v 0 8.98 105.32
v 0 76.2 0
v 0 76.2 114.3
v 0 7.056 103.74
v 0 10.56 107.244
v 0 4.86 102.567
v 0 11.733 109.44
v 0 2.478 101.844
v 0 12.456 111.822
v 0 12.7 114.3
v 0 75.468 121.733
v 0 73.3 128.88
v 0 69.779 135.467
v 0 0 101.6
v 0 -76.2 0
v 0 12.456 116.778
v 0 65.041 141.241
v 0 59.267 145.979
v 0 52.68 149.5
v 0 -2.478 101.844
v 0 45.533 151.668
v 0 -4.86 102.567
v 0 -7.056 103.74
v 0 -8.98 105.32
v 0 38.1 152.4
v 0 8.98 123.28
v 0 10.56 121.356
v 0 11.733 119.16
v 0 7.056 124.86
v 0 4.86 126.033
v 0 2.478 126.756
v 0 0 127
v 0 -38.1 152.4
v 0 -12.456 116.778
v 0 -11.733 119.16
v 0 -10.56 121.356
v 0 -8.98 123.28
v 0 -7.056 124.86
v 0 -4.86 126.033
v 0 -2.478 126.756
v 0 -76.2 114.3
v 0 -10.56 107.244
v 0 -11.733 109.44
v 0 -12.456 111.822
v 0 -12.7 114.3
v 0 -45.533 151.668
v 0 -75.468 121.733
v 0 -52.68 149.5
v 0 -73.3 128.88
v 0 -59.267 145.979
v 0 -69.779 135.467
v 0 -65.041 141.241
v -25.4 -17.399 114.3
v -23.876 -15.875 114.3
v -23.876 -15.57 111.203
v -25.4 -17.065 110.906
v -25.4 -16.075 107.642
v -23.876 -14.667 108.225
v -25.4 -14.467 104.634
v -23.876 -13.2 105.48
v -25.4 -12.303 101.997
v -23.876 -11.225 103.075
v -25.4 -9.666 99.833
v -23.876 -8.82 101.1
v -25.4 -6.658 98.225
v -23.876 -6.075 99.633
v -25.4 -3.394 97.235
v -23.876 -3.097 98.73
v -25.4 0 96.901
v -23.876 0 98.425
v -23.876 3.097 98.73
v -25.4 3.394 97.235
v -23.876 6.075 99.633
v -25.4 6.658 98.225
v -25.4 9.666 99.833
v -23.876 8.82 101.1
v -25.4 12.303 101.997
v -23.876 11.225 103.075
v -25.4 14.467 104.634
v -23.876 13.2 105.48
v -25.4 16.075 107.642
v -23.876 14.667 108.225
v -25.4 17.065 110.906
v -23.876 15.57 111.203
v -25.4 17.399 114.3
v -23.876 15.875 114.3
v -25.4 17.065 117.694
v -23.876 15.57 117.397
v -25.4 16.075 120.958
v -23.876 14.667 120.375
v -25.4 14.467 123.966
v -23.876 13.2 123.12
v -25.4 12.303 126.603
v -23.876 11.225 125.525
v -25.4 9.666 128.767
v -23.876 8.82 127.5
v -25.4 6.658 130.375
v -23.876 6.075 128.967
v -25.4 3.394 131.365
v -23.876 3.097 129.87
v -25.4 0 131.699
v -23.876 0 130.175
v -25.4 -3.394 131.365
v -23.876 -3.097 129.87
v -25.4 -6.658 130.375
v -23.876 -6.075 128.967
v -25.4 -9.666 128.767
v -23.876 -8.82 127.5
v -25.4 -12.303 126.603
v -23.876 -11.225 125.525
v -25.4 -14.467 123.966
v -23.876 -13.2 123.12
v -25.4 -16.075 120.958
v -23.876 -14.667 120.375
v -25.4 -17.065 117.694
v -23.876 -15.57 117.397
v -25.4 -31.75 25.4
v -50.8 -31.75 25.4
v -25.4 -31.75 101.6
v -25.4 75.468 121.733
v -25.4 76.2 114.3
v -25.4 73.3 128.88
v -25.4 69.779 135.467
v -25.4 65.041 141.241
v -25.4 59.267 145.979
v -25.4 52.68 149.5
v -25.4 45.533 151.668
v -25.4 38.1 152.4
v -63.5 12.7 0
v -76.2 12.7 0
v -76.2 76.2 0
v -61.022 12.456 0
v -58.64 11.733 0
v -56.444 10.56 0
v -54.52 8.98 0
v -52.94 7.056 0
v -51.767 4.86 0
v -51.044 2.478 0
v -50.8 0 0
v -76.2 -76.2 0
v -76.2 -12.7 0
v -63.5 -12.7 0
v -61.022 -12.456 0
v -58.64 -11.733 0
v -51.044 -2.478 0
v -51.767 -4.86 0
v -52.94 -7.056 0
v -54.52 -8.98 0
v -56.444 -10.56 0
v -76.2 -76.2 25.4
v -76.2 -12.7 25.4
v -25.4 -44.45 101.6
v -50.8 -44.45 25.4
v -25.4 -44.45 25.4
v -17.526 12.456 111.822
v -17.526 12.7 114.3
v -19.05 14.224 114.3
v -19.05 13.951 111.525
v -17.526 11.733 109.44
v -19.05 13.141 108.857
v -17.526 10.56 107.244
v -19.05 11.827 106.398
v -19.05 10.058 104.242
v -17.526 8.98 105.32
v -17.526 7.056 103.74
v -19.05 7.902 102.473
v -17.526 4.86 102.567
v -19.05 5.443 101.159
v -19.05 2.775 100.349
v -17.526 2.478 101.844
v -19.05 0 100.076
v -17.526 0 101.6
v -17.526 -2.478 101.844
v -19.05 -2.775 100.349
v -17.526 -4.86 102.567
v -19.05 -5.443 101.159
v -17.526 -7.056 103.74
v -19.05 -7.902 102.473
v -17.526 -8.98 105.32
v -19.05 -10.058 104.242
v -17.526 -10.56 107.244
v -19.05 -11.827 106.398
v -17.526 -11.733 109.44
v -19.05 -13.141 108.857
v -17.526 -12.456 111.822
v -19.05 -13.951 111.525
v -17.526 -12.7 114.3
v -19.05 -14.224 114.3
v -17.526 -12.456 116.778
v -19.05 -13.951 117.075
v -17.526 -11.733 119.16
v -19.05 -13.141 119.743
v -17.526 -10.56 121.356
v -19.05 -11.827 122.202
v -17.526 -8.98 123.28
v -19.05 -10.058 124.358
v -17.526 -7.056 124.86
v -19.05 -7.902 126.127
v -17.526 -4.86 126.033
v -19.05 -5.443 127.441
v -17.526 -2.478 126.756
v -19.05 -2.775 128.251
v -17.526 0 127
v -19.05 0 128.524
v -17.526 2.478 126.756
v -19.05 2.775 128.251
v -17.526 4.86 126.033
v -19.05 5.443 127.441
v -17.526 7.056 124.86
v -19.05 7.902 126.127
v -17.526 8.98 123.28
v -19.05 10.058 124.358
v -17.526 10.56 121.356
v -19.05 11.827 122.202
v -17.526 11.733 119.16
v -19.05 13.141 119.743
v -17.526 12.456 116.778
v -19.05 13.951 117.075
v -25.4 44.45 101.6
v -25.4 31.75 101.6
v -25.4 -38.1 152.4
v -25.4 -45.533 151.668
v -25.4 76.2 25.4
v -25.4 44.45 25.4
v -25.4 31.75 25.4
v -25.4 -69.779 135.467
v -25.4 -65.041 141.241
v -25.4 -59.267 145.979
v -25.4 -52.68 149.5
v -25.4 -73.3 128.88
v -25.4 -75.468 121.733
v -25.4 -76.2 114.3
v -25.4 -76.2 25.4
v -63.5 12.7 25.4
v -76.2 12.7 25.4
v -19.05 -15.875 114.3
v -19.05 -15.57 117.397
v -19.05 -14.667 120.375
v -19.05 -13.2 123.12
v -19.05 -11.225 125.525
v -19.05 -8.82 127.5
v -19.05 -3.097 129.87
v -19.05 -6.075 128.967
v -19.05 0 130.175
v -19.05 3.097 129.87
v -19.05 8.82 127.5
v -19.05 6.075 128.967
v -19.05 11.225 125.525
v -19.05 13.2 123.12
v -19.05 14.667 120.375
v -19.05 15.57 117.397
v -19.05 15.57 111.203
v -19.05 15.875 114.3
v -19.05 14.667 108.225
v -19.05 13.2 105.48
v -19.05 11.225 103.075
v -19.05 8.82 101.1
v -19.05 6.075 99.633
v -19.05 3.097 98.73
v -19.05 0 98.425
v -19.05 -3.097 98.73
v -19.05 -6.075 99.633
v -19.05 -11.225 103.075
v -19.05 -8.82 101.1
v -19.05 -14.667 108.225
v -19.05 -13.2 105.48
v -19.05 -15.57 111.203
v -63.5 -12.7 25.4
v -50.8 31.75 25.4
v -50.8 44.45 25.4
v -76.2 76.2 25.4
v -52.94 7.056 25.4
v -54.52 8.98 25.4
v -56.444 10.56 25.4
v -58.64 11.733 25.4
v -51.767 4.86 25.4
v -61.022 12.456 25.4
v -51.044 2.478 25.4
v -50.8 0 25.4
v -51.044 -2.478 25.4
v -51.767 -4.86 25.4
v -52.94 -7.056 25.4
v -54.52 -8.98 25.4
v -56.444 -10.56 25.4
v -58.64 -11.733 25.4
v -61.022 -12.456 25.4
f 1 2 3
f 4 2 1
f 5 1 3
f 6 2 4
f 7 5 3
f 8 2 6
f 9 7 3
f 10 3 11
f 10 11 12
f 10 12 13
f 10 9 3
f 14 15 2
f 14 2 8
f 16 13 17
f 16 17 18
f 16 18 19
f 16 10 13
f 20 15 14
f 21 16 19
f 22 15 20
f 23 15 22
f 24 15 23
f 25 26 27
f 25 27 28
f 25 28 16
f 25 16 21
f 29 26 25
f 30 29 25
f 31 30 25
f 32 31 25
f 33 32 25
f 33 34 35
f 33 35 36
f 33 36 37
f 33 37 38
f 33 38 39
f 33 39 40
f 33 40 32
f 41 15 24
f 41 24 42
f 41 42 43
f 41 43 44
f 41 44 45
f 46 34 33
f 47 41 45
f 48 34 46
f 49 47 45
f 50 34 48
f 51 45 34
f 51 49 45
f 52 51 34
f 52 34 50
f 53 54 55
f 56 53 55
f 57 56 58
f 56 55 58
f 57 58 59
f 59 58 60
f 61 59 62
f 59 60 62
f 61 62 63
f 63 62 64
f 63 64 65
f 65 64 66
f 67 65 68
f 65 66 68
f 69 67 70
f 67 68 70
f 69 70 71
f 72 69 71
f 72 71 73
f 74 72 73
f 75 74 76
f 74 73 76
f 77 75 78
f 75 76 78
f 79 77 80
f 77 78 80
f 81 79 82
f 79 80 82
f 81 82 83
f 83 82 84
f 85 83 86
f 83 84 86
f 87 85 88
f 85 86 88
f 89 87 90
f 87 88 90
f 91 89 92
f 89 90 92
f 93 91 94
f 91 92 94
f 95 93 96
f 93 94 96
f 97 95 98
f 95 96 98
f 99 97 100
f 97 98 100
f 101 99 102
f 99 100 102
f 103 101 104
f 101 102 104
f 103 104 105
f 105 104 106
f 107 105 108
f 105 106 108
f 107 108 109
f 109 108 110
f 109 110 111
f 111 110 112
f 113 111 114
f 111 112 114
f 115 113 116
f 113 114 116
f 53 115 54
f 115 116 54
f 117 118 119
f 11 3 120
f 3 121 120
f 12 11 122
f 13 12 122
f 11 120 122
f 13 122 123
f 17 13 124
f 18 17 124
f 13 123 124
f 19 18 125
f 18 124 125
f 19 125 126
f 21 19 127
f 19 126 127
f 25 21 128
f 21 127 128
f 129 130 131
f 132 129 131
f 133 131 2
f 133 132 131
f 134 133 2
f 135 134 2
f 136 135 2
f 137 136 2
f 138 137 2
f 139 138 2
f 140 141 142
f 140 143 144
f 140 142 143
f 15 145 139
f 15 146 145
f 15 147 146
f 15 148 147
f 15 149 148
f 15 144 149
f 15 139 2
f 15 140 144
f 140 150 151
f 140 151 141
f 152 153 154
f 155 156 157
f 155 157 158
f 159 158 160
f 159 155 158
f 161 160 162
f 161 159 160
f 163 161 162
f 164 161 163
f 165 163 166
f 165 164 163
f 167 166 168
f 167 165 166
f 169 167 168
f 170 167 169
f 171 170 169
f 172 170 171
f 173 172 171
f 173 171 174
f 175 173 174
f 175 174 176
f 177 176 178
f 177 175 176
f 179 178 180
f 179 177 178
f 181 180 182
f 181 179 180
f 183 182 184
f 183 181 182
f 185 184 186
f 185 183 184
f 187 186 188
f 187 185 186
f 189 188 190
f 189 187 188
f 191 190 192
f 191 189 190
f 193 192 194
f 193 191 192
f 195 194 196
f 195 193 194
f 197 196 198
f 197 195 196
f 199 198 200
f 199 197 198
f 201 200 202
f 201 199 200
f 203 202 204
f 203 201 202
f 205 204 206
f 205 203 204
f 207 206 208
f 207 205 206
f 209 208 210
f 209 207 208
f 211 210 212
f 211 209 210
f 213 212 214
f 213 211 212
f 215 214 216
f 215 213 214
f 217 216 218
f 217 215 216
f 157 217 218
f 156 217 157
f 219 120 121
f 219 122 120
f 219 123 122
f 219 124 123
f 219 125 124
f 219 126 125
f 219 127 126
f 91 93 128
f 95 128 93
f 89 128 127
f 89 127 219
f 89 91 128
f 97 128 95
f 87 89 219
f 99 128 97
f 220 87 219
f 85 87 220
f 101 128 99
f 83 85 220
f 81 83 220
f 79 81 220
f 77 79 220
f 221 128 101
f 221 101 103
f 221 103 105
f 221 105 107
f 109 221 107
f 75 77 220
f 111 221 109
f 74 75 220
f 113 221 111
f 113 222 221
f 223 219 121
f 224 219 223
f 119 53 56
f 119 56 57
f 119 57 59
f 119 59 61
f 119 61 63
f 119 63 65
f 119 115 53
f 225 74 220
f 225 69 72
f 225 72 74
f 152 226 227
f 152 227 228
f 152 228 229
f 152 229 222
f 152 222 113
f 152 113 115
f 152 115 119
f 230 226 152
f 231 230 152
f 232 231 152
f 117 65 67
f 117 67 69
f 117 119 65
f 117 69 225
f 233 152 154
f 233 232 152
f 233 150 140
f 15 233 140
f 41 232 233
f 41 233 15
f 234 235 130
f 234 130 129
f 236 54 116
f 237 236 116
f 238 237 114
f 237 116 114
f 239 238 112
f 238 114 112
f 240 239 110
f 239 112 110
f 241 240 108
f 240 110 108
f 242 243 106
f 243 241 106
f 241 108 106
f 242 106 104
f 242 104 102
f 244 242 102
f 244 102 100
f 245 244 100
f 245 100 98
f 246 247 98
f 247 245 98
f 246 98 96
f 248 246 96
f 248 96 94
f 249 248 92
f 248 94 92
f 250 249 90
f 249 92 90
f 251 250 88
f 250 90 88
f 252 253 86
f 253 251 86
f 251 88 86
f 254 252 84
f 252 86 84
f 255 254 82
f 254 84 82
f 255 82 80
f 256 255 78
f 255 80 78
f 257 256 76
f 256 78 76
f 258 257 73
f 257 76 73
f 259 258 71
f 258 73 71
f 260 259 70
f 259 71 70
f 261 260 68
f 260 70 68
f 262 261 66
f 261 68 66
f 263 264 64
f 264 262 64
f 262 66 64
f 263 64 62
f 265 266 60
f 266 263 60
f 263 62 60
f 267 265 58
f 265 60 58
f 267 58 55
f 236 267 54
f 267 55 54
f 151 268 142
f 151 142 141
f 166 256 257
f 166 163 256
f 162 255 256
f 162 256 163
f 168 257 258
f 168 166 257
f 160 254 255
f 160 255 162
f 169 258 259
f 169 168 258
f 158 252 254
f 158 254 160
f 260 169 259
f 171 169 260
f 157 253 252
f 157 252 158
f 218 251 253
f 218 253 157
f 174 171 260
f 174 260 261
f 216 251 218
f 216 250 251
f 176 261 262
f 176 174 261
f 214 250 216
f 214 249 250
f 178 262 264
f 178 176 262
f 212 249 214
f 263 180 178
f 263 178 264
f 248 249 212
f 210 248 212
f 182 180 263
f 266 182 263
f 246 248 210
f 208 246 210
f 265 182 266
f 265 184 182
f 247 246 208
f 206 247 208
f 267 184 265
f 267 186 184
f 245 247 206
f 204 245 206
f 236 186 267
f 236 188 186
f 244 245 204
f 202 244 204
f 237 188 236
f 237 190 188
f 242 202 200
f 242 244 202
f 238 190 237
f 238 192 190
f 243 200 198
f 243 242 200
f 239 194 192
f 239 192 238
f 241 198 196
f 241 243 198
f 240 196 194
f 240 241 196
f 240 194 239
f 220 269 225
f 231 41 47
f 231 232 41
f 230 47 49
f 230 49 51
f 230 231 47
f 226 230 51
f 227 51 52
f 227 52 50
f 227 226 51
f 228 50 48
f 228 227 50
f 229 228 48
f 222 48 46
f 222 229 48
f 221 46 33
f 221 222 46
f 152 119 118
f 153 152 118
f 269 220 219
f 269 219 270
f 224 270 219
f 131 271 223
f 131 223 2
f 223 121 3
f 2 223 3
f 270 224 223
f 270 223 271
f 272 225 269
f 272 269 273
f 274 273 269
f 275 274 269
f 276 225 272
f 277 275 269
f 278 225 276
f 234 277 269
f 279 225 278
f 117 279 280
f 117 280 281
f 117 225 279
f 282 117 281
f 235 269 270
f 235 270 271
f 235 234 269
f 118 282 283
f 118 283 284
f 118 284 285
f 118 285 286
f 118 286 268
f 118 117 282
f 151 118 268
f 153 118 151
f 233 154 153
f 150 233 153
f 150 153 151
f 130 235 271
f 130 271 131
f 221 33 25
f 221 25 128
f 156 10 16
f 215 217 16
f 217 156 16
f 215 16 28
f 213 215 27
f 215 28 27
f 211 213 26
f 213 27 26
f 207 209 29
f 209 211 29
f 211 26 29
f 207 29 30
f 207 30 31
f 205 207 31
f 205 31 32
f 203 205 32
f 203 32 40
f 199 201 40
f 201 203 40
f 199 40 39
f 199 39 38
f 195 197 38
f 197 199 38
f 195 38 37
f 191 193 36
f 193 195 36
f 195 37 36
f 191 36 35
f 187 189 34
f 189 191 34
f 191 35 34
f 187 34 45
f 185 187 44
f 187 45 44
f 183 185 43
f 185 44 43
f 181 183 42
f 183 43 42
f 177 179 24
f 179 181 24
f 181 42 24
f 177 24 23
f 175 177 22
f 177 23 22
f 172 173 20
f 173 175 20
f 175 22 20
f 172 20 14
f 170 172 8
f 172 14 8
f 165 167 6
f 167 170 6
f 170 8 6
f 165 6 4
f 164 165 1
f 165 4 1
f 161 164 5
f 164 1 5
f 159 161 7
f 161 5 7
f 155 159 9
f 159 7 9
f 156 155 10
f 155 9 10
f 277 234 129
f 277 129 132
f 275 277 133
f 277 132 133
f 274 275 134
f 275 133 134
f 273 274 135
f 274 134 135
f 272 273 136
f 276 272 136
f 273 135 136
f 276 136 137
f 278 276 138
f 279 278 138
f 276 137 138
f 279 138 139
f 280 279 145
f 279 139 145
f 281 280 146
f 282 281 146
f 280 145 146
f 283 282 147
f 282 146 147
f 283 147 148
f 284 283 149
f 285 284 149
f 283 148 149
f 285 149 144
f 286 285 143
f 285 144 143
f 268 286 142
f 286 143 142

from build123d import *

# Parameters (mm, degrees)
F1_DEPTH  = 76.2
F2_R      = 12.7
F3_DEPTH  = 76.201
F5_DEPTH  = 152.401
F6_R      = 38.1
F7_R      = 15.875
F8_DEPTH  = 6.35
F11_DEPTH = 12.7
F13_SIZE  = 1.524


with BuildPart() as f1:
    # F0 (on Front) → F1 (new body, symmetric)
    with BuildSketch(Plane.XZ):
        Polygon((-76.2, 0), (0, 0), (0, 152.4), (-25.4, 152.4), (-25.4, 25.4), (-76.2, 25.4), align=None)
    extrude(amount=F1_DEPTH, both=True)

    # F2 (on face) → F3 (cut, through all)
    with BuildSketch(Plane.YZ):
        with Locations((0, 114.3)):
            Circle(F2_R)
    extrude(amount=-F3_DEPTH, mode=Mode.SUBTRACT)

    # F4 (on face) → F5 (cut, through all)
    with BuildSketch(Plane(origin=(0, 0, 0), x_dir=(1, 0, 0), z_dir=(0, 0, -1))):
        with BuildLine():
            Line((-76.2, 12.7), (-76.2, -12.7))
            Line((-76.2, -12.7), (-63.5, -12.7))
            ThreePointArc((-63.5, -12.7), (-50.8, 0), (-63.5, 12.7))
            Line((-63.5, 12.7), (-76.2, 12.7))
        make_face()
    extrude(amount=-F5_DEPTH, mode=Mode.SUBTRACT)

    # F6
    f6_edges = [f1.edges().sort_by_distance(p)[0] for p in [
        (-12.7, 76.2, 152.4),
        (-12.7, -76.2, 152.4),
    ]]
    fillet(f6_edges, radius=F6_R)

    # F7 (on face) → F8 (cut)
    with BuildSketch(Plane(origin=(-25.4, 0, 0), x_dir=(0, -1, 0), z_dir=(-1, 0, 0))):
        with Locations((0, 114.3)):
            Circle(F7_R)
    extrude(amount=-F8_DEPTH, mode=Mode.SUBTRACT)

    # F10 (on offset) → F11 (join)
    with BuildSketch(Plane.XZ.offset(31.75)):
        Polygon((-25.4, 101.6), (-50.8, 25.4), (-25.4, 25.4), align=None)
    extrude(amount=F11_DEPTH)

    # F12: F1 across plane


with BuildPart() as f1_1:
    add(f1.part)
    add(f1.part.mirror(Plane.XZ))

    # F13
    f13_edges = [f1_1.edges().sort_by_distance(p)[0] for p in [
        (-25.4, 15.875, 114.3),
        (-19.05, -12.7, 114.3),
    ]]
    chamfer(f13_edges, length=F13_SIZE)


solid = f1_1.part
